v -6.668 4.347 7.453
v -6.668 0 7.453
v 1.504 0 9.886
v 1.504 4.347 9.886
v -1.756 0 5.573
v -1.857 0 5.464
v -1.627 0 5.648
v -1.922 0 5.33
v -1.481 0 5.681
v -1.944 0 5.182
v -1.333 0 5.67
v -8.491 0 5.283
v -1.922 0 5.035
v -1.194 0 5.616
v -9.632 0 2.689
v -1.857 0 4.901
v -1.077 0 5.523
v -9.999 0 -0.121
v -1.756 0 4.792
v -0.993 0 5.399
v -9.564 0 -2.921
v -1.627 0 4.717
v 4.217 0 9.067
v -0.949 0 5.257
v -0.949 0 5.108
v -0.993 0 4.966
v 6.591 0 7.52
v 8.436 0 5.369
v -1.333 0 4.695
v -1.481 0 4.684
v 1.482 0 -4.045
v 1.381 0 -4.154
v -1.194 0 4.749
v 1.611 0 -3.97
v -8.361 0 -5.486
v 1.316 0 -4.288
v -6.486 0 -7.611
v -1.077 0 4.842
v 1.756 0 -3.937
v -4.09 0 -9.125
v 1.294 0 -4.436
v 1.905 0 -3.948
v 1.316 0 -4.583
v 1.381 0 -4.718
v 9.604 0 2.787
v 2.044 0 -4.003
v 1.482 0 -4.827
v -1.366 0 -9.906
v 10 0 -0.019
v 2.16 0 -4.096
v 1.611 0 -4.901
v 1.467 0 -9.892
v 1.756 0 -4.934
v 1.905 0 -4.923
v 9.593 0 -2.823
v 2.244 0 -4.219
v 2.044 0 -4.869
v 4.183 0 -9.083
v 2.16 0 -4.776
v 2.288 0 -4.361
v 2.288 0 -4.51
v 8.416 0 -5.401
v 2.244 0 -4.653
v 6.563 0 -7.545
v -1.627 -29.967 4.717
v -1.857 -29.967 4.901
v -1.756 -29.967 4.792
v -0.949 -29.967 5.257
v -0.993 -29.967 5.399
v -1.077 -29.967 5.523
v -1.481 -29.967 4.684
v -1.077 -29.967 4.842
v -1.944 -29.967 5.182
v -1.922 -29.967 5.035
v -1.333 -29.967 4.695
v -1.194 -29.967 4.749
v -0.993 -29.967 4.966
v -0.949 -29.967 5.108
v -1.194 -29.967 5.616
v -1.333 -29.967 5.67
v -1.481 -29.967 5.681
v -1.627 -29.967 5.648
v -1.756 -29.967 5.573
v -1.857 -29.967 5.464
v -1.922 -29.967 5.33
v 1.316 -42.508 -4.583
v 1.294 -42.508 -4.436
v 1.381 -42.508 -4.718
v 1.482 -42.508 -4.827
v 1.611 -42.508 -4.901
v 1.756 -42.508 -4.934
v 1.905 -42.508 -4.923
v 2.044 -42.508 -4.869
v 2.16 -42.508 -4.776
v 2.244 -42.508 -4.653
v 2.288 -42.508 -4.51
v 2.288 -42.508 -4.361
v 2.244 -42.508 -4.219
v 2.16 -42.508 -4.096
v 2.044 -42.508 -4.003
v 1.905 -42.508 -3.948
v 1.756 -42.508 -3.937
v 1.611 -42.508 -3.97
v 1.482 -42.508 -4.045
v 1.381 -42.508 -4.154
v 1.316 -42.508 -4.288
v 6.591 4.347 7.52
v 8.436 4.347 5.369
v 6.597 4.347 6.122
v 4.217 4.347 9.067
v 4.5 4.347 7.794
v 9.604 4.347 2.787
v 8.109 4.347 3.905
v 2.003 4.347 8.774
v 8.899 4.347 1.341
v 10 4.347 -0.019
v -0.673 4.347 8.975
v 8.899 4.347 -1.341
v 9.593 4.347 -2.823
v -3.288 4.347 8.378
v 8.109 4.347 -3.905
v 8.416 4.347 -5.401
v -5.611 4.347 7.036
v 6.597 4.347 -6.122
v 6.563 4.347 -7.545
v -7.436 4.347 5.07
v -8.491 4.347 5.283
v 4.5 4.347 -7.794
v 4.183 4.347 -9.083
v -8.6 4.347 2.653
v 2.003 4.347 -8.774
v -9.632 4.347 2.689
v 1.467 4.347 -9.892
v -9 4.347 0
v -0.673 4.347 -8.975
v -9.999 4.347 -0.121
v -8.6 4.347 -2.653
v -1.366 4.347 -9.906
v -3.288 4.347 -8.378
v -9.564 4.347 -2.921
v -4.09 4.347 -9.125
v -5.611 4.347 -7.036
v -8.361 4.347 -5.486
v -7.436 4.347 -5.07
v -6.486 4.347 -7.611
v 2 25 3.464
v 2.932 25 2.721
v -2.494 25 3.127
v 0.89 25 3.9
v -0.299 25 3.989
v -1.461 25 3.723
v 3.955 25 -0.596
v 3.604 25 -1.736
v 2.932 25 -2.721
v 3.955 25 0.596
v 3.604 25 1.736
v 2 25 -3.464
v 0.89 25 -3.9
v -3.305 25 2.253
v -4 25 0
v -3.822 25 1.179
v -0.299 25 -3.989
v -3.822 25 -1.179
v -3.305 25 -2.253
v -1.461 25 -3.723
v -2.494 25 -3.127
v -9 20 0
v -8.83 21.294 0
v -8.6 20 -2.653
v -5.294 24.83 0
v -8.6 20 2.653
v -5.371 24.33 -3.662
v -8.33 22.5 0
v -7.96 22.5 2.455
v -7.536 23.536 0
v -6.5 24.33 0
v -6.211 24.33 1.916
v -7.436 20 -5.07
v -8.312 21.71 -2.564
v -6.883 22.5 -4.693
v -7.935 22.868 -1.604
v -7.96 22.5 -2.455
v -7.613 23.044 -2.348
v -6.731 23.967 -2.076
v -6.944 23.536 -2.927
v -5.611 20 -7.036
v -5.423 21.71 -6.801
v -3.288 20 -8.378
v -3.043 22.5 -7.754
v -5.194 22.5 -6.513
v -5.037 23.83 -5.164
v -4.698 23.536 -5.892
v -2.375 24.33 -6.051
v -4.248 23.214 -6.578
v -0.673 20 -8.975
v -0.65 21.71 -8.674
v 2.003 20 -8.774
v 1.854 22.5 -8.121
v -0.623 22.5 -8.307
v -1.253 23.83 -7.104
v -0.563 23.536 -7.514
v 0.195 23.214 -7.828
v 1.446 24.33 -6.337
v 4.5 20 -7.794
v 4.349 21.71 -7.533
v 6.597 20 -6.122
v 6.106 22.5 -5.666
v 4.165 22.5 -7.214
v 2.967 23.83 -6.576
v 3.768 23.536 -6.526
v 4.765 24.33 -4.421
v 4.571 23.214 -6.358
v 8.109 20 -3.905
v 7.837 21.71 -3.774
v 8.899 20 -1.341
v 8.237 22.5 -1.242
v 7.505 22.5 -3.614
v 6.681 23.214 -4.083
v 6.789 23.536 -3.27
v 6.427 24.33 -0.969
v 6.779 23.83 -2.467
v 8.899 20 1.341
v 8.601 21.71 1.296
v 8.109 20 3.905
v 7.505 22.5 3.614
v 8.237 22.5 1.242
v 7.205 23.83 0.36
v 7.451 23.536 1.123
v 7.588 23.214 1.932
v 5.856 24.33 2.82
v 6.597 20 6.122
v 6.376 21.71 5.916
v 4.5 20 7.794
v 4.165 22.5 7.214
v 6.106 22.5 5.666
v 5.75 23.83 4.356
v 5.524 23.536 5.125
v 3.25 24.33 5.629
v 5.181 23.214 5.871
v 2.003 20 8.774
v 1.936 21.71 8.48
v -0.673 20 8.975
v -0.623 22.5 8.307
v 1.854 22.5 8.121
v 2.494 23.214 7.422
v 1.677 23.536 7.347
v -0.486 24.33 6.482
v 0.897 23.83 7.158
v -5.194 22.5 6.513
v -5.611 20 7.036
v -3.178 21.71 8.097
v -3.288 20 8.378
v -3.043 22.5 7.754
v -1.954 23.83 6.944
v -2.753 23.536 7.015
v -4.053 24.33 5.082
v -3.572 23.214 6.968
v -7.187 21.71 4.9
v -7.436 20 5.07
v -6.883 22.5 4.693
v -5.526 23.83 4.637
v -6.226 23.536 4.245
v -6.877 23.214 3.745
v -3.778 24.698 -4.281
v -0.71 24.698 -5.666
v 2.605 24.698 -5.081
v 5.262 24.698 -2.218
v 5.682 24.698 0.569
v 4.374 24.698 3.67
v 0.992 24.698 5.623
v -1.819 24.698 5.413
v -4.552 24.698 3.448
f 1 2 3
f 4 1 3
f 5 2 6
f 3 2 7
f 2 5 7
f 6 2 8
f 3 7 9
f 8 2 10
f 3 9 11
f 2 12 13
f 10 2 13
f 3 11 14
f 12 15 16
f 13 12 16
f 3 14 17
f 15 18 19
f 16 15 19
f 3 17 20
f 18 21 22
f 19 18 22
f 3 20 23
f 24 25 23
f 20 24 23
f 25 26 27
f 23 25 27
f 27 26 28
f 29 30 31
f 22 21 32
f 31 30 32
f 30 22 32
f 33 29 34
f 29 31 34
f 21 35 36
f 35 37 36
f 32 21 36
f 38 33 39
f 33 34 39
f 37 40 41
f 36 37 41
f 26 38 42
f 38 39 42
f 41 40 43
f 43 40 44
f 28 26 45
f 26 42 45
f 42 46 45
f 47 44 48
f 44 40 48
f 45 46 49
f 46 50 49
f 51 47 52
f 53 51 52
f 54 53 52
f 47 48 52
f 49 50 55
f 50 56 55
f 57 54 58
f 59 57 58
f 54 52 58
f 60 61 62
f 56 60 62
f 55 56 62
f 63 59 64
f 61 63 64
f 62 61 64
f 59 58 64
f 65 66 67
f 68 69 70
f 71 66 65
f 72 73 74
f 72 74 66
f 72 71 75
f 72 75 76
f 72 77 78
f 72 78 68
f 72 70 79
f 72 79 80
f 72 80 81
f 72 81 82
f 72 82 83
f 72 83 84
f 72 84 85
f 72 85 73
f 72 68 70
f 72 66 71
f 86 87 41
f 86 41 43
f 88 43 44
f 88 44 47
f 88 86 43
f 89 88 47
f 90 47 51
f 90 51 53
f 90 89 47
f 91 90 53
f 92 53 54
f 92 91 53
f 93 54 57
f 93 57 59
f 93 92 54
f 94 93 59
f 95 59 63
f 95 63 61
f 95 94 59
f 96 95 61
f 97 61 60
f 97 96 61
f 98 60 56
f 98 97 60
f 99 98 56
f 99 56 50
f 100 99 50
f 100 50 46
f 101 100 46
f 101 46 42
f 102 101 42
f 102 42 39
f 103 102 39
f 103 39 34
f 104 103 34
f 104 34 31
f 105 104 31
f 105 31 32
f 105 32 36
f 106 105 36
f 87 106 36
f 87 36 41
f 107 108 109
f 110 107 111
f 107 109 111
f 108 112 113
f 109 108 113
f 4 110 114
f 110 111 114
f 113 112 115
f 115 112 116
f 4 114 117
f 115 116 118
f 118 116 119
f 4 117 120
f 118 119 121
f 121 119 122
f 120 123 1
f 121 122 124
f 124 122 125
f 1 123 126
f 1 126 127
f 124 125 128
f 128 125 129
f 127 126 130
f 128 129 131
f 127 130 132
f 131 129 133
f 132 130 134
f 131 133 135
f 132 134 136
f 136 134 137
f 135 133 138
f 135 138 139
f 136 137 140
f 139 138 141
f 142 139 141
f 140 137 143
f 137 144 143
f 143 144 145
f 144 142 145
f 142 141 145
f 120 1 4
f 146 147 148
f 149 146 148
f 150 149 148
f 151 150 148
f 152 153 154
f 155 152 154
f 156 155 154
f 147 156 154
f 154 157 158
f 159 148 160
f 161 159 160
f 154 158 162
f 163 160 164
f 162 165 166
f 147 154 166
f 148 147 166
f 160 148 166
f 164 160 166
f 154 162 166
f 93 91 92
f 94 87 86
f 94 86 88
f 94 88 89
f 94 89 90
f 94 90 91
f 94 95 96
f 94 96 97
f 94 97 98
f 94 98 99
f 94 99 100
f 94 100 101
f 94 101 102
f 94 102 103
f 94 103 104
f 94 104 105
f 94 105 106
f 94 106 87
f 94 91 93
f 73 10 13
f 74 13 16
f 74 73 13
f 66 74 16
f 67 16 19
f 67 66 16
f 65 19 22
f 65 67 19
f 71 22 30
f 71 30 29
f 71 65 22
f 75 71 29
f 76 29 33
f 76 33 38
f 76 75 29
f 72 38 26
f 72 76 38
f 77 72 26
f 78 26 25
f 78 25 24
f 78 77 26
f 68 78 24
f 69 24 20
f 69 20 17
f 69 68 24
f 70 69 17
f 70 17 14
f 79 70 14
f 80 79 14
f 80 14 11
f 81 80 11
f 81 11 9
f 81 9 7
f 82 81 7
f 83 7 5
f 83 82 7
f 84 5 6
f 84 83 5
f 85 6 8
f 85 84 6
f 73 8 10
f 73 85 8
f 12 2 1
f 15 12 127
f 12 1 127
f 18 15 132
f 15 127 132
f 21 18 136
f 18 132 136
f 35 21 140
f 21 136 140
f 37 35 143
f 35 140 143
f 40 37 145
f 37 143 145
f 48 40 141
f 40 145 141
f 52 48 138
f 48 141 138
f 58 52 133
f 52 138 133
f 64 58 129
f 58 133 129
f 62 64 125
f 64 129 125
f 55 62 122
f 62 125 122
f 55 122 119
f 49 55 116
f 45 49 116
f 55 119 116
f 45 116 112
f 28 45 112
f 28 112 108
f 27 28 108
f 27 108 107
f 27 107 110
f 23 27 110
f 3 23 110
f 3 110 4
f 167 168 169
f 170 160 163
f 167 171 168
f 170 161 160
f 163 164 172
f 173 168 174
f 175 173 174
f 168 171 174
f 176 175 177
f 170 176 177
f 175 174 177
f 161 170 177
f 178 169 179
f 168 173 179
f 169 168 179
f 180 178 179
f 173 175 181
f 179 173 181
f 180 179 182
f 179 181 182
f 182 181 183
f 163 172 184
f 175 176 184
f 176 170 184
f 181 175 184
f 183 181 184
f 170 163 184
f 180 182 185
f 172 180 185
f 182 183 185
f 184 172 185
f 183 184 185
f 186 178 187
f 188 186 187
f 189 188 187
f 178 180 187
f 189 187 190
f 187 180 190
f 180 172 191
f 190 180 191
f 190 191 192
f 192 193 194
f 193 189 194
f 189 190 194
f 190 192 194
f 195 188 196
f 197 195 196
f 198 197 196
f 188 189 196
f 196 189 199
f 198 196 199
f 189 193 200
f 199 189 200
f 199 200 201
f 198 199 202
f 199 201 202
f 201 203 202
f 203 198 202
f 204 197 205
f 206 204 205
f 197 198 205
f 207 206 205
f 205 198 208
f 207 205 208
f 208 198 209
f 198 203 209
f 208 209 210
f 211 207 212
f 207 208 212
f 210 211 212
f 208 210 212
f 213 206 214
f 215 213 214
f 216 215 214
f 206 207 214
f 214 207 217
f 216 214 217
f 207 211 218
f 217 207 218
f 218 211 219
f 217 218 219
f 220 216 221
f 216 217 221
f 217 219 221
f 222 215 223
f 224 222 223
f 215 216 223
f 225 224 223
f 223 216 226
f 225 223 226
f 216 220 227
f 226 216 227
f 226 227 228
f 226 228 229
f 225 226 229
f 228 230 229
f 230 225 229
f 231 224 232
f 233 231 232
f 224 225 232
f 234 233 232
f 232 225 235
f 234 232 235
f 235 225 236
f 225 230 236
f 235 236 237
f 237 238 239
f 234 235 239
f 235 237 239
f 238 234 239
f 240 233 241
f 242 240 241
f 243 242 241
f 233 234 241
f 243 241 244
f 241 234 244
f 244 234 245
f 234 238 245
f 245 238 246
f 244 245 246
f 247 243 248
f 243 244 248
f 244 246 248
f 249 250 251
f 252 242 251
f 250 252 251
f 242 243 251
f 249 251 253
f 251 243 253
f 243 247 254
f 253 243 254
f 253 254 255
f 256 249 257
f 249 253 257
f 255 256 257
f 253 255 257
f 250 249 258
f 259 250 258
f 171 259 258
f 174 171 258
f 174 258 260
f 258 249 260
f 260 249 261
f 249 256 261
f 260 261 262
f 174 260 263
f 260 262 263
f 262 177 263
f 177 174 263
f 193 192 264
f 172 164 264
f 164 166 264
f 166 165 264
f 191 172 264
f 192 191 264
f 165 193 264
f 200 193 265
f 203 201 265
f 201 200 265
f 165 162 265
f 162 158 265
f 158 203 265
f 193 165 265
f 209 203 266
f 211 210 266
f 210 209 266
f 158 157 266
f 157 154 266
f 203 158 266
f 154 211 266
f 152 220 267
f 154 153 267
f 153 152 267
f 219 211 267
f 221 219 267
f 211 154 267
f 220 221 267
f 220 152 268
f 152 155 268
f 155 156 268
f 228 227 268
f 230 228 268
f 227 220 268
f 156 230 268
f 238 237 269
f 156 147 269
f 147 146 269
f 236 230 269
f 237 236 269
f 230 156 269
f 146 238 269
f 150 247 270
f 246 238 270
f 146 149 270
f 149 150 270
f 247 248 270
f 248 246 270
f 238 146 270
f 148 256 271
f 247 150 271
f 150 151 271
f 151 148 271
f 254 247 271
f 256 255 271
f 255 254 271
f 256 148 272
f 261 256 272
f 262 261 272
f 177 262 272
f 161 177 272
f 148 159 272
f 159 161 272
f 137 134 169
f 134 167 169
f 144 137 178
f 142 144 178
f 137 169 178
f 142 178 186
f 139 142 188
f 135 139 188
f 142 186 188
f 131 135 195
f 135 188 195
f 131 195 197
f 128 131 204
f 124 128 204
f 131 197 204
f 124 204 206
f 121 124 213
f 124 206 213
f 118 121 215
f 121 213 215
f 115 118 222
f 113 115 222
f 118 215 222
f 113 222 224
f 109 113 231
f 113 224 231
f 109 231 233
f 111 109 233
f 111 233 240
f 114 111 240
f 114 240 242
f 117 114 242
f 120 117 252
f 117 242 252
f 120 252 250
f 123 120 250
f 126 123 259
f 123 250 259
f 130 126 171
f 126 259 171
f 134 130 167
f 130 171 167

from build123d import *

# Parameters (mm, degrees)
KES_EKSTR_ZYON2_DEPTH = 10
IZIM4_R               = 0.5
IZIM6_R               = 0.5


with BuildPart() as part:
    # Çizim1 → Döndür2 (revolve)
    with BuildSketch(Plane.XY, mode=Mode.PRIVATE) as d_nd_r2_sk:
        with BuildLine():
            Line((0, 0), (10, 0))
            Line((10, 0), (10, 4.346574423))
            Line((10, 4.346574423), (9, 4.346574423))
            Line((9, 4.346574423), (9, 20))
            ThreePointArc((9, 20), (7.535533906, 23.535533906), (4, 25))
            Line((4, 25), (0, 25))
            Line((0, 25), (0, 0))
        make_face()
    revolve(d_nd_r2_sk.sketch.rotate(Axis((0, 25, 0), (0, -1, 0)), 180), axis=Axis((0, 25, 0), (0, -1, 0)))

    # Çizim2 → Kes-Ekstrüzyon2 (cut)
    with BuildSketch(Plane.XZ):
        Polygon((-6.667667497, 7.452664634), (1.504038202, 9.886246461), (0.616082269, 11.592722448), (-7.506944277, 10), align=None)
    extrude(amount=-KES_EKSTR_ZYON2_DEPTH, mode=Mode.SUBTRACT)

    # Süpür1: sweep along a curve in space
    with BuildLine() as s_p_r1_path:
        Line((-1.443878782, 1.853325266, 5.182498136), (-1.443878782, -29.967465354, 5.182498136))
    # Çizim4 → Süpür1 (sweep)
    with BuildSketch(Plane(origin=(-1.443878782, -29.967465354, 5.182498136), x_dir=(-1, 0, 0), z_dir=(0, -1, 0))):
        Circle(IZIM4_R)
    sweep(path=s_p_r1_path.line)

    # Süpür2: sweep along a curve in space
    with BuildLine() as s_p_r2_path:
        Line((1.793792857, 0, -4.435841685), (1.793792857, -42.508039012, -4.435841685))
    # Çizim6 → Süpür2 (sweep)
    with BuildSketch(Plane(origin=(1.793792857, -42.508039012, -4.435841685), x_dir=(-1, 0, 0), z_dir=(0, -1, 0))):
        Circle(IZIM6_R)
    sweep(path=s_p_r2_path.line)


solid = part.part
